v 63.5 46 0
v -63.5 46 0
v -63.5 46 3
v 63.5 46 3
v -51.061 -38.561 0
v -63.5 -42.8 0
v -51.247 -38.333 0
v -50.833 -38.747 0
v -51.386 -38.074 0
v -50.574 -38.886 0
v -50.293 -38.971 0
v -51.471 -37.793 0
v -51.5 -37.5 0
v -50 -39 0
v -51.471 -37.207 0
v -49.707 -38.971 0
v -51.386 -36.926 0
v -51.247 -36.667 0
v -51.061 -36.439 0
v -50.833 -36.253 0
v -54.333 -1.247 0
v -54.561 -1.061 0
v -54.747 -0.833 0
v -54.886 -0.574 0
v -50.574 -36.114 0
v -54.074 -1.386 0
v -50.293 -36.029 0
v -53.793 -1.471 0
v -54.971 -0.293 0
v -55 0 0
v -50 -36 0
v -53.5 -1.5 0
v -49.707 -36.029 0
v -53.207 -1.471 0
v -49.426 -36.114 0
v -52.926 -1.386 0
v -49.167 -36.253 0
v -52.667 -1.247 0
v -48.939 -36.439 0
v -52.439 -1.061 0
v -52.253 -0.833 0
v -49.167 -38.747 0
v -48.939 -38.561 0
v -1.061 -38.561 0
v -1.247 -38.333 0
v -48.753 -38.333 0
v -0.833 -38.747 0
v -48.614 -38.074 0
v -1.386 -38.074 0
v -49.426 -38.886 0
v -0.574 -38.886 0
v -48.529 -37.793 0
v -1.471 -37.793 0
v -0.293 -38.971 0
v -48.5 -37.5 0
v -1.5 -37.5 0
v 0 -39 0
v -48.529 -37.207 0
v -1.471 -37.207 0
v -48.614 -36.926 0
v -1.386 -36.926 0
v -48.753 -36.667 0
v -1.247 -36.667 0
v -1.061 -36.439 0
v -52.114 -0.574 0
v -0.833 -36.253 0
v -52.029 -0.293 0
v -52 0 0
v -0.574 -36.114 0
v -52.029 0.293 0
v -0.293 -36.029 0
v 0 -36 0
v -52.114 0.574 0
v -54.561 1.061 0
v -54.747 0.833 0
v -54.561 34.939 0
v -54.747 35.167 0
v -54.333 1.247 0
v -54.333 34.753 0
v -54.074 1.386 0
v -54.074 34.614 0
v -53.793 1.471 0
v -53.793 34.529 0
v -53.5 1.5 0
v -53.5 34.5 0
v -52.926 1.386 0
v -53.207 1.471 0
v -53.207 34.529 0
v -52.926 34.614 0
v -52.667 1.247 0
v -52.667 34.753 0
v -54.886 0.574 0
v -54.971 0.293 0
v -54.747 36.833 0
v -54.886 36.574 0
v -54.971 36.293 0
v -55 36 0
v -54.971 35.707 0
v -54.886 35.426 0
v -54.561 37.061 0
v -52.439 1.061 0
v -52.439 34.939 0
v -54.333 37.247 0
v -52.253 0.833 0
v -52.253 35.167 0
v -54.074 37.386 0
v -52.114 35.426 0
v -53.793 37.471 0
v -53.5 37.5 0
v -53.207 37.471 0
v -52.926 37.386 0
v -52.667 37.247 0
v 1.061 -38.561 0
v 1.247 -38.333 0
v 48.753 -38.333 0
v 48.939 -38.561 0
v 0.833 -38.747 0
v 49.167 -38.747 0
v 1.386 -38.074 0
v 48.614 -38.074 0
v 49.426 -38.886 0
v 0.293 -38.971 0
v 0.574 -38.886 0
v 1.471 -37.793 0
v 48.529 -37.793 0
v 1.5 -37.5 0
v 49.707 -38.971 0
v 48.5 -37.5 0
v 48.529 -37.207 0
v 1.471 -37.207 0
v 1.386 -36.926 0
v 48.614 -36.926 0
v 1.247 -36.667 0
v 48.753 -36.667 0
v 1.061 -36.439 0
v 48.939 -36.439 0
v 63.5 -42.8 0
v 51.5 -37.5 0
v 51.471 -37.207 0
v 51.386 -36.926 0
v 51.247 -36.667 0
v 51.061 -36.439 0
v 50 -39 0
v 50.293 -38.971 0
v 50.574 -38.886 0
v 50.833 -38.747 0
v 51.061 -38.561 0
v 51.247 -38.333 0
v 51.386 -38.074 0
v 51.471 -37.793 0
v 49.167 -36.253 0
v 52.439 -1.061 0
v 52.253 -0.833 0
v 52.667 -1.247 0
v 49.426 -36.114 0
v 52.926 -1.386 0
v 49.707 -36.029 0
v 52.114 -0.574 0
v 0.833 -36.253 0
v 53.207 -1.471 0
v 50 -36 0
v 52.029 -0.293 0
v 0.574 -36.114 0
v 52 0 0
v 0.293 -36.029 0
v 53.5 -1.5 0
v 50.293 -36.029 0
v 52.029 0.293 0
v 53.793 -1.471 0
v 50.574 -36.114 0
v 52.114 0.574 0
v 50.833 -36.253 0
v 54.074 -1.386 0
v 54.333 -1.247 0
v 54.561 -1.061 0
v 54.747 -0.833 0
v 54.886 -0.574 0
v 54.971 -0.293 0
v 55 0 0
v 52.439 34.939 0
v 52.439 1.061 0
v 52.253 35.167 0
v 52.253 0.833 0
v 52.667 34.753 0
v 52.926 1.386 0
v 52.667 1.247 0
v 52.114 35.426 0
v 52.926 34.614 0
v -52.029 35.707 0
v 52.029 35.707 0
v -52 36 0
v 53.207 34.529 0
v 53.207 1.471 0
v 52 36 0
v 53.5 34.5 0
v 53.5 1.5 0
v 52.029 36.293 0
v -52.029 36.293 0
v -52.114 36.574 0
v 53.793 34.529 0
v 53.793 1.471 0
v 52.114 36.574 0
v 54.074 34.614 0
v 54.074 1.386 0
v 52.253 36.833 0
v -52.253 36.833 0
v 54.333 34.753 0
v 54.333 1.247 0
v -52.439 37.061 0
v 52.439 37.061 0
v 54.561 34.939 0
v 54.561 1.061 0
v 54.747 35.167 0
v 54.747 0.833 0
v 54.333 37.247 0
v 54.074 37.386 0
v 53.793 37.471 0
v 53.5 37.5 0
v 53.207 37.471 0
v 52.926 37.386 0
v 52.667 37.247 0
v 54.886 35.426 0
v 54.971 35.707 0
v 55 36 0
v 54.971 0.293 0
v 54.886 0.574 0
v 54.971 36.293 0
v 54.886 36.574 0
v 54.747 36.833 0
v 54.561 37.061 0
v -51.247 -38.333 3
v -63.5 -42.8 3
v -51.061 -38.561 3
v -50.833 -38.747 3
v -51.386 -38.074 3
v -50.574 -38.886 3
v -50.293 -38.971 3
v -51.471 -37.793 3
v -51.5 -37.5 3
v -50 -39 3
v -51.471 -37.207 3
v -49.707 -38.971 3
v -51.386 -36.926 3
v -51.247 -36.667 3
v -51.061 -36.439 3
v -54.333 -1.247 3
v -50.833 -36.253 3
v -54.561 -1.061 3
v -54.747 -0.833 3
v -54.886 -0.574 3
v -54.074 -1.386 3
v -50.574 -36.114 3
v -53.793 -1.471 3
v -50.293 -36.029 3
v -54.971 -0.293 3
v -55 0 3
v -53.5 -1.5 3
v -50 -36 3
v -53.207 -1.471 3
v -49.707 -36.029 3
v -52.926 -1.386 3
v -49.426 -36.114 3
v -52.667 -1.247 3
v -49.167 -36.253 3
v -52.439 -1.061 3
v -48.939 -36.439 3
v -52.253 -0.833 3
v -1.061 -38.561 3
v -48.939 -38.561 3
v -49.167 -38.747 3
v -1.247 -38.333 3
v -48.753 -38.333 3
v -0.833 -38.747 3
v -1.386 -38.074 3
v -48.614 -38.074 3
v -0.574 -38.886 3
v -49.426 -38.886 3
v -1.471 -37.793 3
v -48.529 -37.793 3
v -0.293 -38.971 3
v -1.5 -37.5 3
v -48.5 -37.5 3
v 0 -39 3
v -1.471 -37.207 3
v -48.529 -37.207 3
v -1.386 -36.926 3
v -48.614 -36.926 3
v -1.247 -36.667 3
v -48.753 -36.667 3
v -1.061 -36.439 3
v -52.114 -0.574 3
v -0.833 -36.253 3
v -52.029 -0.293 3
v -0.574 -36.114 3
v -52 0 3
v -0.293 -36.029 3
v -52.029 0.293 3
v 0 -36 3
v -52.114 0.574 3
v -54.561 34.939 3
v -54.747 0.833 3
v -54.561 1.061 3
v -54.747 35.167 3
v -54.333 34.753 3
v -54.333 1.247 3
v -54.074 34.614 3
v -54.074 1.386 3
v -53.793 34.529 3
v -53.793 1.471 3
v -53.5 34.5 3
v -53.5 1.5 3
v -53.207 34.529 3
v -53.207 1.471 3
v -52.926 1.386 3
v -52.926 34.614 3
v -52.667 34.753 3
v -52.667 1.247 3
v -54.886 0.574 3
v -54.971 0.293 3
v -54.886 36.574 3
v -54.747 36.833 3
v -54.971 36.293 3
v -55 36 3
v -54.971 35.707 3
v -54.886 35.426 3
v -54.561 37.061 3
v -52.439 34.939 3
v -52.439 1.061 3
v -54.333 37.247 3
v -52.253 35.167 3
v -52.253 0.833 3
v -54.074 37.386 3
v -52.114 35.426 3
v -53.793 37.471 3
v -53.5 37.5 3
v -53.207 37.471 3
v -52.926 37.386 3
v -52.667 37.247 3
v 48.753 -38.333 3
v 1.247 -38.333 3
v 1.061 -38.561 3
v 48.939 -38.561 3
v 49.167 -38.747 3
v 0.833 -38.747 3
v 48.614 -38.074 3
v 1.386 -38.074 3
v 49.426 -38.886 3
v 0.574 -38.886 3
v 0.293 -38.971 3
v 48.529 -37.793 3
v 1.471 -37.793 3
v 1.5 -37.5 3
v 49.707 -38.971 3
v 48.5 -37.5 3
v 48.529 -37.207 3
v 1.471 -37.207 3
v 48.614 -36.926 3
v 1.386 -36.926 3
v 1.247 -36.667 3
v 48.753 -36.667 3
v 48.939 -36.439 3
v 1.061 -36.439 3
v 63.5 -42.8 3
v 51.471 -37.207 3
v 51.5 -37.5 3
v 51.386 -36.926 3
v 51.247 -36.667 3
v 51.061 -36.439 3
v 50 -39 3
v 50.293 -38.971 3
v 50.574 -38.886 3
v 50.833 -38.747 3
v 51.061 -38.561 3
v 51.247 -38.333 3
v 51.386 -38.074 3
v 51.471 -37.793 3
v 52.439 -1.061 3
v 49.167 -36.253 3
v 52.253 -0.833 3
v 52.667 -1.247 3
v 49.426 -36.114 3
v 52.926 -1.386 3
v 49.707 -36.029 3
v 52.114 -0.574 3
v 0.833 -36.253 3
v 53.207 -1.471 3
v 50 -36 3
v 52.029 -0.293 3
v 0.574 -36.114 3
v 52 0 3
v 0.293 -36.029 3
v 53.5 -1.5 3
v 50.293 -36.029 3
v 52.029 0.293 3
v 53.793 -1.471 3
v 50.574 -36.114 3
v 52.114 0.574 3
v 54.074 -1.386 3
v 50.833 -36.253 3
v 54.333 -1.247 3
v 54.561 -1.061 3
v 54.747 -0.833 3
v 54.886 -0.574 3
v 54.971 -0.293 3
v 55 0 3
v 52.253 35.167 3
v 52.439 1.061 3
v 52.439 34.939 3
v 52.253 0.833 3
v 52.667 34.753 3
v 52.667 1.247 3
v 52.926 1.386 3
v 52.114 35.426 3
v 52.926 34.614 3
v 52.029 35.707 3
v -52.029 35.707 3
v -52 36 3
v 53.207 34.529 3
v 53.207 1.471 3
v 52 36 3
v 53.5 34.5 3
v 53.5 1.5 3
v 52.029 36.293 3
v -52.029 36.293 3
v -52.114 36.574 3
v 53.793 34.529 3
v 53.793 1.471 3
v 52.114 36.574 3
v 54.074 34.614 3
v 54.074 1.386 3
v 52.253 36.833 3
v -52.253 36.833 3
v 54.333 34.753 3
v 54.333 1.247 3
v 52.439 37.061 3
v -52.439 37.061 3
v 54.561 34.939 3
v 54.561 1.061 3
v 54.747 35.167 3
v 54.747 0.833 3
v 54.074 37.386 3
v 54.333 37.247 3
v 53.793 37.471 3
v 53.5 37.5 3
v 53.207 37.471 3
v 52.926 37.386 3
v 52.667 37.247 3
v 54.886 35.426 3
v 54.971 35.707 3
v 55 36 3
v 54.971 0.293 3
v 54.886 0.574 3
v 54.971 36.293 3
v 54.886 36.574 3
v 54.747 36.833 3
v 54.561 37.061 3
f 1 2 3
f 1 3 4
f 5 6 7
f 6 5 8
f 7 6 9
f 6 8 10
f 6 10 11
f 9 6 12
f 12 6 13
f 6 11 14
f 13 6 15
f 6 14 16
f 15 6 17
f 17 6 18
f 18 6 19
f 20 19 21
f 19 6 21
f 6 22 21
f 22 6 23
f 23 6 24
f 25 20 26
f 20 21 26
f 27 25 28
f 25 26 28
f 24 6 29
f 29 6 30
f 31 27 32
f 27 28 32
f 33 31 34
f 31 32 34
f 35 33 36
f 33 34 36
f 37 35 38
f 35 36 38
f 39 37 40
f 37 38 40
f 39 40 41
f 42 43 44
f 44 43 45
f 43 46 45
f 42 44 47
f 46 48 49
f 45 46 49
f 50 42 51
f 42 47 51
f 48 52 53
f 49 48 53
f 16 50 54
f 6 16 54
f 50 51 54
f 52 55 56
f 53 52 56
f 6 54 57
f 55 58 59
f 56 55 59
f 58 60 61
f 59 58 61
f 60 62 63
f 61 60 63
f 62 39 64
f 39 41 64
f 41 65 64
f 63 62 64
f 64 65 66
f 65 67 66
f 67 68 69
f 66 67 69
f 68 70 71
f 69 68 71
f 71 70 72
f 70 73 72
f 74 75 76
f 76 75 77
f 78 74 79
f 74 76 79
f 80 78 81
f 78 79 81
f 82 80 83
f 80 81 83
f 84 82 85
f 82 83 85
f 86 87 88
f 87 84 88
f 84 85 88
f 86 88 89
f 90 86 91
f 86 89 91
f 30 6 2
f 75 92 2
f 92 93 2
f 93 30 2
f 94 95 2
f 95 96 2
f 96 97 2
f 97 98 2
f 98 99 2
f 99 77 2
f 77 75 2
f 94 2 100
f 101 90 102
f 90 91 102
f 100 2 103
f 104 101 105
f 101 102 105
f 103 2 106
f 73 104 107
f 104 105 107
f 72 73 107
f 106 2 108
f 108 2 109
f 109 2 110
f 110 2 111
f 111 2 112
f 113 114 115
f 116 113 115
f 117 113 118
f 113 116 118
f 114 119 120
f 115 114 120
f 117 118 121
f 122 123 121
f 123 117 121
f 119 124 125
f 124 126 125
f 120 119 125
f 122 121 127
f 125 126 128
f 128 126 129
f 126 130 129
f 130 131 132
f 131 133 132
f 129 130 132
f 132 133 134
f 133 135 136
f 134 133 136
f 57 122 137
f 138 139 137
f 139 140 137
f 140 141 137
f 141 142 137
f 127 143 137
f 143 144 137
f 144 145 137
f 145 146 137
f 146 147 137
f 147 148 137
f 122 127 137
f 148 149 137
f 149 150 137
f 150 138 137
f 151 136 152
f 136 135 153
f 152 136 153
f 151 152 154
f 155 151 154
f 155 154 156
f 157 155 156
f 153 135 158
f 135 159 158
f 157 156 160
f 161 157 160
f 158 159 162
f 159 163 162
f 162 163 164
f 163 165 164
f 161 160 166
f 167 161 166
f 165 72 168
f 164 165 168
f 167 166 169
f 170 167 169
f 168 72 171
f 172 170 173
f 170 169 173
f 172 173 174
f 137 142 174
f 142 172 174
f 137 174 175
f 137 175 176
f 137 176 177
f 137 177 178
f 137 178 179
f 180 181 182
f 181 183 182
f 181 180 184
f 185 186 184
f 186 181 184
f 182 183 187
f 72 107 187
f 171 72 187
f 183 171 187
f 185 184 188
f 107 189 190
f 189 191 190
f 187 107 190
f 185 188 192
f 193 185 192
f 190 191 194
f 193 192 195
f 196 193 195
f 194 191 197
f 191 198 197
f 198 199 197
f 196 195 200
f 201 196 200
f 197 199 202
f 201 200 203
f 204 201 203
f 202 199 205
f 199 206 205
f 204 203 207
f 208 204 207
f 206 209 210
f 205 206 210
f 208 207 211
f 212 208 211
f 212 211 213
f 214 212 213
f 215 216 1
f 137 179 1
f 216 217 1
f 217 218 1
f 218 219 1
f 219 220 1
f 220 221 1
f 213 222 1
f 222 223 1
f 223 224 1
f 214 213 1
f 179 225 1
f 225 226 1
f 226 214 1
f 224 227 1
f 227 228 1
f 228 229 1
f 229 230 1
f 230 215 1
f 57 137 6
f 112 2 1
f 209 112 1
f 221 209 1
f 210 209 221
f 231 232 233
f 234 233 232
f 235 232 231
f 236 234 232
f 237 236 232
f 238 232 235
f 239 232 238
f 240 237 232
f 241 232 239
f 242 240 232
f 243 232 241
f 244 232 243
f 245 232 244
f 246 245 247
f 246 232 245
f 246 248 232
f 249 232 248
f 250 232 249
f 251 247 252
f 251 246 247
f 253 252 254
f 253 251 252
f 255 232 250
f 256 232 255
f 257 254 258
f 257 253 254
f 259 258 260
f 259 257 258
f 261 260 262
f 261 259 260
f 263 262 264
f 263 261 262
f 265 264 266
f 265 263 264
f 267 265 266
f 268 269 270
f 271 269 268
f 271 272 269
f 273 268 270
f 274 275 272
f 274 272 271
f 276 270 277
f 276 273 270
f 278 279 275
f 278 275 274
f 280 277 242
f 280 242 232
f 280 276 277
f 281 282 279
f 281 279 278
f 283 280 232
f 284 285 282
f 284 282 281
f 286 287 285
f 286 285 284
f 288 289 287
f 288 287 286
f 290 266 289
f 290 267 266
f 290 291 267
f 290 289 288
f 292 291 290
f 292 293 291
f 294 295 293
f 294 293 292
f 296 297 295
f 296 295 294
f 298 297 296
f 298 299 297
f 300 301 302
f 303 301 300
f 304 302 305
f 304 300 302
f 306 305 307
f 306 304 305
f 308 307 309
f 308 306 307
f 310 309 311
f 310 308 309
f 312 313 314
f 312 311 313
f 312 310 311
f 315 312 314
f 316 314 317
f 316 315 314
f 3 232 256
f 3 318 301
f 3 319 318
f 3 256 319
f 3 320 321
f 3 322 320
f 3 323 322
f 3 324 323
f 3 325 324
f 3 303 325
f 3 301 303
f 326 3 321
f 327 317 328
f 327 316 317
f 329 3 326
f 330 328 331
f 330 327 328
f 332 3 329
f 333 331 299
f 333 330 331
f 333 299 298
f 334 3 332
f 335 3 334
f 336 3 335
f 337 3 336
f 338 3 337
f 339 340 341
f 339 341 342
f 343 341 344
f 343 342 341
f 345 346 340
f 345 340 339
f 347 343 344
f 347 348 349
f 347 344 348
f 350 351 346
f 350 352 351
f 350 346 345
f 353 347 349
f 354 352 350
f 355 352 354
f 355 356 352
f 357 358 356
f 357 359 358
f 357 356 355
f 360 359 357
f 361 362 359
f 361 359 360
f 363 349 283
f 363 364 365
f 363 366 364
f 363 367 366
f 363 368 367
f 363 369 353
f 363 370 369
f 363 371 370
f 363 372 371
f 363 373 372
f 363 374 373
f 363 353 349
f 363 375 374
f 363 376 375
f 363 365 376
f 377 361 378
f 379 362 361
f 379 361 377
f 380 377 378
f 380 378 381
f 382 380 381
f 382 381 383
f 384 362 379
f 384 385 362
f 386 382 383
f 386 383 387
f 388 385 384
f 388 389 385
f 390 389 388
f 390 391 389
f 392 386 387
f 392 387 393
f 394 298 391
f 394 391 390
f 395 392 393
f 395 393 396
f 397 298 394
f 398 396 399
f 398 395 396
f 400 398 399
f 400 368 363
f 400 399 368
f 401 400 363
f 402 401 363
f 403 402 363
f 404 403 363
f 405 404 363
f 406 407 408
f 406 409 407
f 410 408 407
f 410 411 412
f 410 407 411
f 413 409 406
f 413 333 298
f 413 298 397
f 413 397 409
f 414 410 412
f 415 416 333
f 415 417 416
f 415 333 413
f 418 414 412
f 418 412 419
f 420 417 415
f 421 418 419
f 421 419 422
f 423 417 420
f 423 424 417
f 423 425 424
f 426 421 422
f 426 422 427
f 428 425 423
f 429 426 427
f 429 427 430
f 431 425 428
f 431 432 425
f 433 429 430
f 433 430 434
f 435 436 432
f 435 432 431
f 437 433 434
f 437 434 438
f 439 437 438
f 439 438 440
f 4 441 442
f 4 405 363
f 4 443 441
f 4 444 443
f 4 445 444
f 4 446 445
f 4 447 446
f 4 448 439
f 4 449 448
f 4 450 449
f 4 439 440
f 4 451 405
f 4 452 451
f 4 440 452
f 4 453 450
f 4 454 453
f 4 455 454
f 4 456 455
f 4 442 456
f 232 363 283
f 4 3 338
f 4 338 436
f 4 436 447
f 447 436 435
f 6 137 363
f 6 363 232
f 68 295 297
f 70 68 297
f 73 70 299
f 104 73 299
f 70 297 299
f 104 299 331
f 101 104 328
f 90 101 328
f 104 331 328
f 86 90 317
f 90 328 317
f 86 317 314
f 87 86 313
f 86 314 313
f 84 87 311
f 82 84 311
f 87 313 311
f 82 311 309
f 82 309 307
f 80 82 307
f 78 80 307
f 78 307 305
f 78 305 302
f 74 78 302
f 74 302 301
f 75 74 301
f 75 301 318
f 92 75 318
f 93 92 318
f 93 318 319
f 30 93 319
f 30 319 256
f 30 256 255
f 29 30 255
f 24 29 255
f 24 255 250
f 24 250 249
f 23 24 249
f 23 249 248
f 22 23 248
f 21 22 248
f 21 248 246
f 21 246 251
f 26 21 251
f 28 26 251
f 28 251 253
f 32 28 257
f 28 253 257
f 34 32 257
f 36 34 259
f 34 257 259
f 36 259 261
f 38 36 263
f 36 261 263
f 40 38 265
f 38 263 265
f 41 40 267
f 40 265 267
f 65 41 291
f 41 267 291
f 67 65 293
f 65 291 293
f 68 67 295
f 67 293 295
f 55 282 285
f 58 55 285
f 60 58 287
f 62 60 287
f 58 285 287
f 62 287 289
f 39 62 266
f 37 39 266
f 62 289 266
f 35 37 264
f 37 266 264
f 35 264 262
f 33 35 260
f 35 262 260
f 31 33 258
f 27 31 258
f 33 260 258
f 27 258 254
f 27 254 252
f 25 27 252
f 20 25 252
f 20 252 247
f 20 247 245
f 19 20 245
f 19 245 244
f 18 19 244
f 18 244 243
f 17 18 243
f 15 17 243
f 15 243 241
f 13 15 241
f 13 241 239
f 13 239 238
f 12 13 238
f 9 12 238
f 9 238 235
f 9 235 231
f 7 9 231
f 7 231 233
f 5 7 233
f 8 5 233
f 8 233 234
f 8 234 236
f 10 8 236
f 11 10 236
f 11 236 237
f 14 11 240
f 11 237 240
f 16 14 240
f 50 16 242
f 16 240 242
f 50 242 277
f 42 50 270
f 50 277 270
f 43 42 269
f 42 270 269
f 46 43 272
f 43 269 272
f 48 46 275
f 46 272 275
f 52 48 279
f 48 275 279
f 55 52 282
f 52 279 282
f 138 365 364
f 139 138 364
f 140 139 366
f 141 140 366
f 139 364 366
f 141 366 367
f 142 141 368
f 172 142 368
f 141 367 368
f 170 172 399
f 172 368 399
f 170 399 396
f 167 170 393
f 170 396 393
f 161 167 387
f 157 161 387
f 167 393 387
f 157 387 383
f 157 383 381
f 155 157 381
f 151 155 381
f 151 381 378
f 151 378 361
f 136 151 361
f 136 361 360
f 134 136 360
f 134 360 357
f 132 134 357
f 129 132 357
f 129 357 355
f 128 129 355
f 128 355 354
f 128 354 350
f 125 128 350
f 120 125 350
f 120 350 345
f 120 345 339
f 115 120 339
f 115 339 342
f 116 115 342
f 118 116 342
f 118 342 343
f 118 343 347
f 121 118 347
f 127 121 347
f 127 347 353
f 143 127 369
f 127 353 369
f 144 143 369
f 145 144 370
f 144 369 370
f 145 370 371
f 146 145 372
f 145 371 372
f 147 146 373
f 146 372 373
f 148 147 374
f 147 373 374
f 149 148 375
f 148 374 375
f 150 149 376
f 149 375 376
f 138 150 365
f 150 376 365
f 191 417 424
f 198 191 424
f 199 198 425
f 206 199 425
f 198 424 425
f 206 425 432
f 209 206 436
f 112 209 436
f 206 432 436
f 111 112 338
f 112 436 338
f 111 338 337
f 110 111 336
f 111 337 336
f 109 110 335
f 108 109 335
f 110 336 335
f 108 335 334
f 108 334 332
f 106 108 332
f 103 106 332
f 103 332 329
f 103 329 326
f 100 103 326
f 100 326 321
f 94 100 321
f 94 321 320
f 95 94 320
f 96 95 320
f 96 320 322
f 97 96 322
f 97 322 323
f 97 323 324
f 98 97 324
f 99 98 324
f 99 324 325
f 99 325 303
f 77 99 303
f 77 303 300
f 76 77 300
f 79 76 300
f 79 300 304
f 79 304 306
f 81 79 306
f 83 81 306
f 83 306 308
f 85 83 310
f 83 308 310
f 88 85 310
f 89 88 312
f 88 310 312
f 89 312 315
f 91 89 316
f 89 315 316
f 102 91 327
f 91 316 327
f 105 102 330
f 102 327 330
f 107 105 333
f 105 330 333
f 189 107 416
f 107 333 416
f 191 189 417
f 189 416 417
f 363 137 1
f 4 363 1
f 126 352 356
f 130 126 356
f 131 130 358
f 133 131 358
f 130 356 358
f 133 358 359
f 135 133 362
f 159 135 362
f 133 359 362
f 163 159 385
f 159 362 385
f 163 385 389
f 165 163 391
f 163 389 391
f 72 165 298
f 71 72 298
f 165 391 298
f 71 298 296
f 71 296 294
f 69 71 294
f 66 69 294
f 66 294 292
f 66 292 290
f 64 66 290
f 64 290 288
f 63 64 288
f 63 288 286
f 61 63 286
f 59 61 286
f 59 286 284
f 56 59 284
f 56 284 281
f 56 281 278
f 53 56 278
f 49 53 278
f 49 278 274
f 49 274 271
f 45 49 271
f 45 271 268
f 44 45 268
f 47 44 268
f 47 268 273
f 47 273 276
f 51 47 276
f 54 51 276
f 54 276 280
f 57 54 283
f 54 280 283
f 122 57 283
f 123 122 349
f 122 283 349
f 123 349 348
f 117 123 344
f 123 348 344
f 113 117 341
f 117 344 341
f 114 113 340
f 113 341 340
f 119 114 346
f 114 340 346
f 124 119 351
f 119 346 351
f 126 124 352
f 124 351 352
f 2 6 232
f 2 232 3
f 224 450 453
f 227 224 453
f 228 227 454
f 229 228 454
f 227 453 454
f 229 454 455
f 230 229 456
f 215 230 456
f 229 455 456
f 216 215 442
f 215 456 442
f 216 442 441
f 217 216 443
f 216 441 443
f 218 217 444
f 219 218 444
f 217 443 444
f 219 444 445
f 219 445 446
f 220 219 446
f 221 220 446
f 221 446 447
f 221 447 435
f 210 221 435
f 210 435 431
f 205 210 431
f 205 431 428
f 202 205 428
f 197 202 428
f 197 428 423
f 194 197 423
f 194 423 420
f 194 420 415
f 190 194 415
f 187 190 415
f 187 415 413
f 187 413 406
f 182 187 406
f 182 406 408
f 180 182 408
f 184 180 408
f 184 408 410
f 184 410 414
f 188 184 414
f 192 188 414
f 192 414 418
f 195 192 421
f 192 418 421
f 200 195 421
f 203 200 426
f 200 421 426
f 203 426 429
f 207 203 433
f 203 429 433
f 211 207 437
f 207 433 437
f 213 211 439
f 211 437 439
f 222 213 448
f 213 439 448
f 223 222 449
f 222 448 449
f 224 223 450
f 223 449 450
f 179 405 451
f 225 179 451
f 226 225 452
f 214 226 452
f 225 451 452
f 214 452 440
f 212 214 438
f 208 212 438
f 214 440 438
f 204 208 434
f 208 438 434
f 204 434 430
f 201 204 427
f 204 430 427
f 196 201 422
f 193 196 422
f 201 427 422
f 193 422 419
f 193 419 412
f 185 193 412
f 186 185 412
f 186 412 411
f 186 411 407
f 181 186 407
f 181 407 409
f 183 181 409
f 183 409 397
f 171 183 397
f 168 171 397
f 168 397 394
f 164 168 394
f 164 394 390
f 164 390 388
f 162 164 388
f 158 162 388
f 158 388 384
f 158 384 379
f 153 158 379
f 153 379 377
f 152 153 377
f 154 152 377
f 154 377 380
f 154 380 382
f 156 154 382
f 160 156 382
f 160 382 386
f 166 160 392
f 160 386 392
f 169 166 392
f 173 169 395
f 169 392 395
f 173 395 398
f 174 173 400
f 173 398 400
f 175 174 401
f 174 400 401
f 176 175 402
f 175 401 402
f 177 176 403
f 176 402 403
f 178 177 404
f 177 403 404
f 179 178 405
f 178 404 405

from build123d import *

# Parameters (mm, degrees)
SKETCH_1_W          = 127
SKETCH_1_H          = 92
EXTRUDE_1_DEPTH     = 3
SKETCH_2_R          = 1.5
CUT_EXTRUDE_1_DEPTH = 79.468146403
SKETCH_3_R          = 1.5
CUT_EXTRUDE_2_DEPTH = 79.468146403
SKETCH_4_W          = 127
SKETCH_4_H          = 3.2
CUT_EXTRUDE_3_DEPTH = 10


with BuildPart() as part:
    # 草图1 → 凸台-拉伸1 (new body)
    with BuildSketch(Plane.XY):
        Rectangle(SKETCH_1_W, SKETCH_1_H)
    extrude(amount=EXTRUDE_1_DEPTH)

    # 草图2 → 切除-拉伸1 (cut, through all)
    with BuildSketch(Plane.XY.offset(3)):
        with Locations((0, -37.5)):
            Circle(SKETCH_2_R)
        with Locations((50, -37.5)):
            Circle(SKETCH_2_R)
        with Locations((-50, -37.5)):
            Circle(SKETCH_2_R)
    extrude(amount=-CUT_EXTRUDE_1_DEPTH, mode=Mode.SUBTRACT)

    # 草图3 → 切除-拉伸2 (cut, through all)
    with BuildSketch(Plane.XY.offset(3)):
        with Locations((-53.5, 36)):
            Circle(SKETCH_3_R)
        with Locations((53.5, 36)):
            Circle(SKETCH_3_R)
        with Locations((-53.5, 0)):
            Circle(SKETCH_3_R)
        with Locations((53.5, 0)):
            Circle(SKETCH_3_R)
    extrude(amount=-CUT_EXTRUDE_2_DEPTH, mode=Mode.SUBTRACT)

    # 草图4 → 切除-拉伸3 (cut)
    with BuildSketch(Plane(origin=(0, 0, 0), x_dir=(-1, 0, 0), z_dir=(0, 0, -1))):
        with Locations((0, -44.4)):
            Rectangle(SKETCH_4_W, SKETCH_4_H)
    extrude(amount=-CUT_EXTRUDE_3_DEPTH, mode=Mode.SUBTRACT)


solid = part.part
